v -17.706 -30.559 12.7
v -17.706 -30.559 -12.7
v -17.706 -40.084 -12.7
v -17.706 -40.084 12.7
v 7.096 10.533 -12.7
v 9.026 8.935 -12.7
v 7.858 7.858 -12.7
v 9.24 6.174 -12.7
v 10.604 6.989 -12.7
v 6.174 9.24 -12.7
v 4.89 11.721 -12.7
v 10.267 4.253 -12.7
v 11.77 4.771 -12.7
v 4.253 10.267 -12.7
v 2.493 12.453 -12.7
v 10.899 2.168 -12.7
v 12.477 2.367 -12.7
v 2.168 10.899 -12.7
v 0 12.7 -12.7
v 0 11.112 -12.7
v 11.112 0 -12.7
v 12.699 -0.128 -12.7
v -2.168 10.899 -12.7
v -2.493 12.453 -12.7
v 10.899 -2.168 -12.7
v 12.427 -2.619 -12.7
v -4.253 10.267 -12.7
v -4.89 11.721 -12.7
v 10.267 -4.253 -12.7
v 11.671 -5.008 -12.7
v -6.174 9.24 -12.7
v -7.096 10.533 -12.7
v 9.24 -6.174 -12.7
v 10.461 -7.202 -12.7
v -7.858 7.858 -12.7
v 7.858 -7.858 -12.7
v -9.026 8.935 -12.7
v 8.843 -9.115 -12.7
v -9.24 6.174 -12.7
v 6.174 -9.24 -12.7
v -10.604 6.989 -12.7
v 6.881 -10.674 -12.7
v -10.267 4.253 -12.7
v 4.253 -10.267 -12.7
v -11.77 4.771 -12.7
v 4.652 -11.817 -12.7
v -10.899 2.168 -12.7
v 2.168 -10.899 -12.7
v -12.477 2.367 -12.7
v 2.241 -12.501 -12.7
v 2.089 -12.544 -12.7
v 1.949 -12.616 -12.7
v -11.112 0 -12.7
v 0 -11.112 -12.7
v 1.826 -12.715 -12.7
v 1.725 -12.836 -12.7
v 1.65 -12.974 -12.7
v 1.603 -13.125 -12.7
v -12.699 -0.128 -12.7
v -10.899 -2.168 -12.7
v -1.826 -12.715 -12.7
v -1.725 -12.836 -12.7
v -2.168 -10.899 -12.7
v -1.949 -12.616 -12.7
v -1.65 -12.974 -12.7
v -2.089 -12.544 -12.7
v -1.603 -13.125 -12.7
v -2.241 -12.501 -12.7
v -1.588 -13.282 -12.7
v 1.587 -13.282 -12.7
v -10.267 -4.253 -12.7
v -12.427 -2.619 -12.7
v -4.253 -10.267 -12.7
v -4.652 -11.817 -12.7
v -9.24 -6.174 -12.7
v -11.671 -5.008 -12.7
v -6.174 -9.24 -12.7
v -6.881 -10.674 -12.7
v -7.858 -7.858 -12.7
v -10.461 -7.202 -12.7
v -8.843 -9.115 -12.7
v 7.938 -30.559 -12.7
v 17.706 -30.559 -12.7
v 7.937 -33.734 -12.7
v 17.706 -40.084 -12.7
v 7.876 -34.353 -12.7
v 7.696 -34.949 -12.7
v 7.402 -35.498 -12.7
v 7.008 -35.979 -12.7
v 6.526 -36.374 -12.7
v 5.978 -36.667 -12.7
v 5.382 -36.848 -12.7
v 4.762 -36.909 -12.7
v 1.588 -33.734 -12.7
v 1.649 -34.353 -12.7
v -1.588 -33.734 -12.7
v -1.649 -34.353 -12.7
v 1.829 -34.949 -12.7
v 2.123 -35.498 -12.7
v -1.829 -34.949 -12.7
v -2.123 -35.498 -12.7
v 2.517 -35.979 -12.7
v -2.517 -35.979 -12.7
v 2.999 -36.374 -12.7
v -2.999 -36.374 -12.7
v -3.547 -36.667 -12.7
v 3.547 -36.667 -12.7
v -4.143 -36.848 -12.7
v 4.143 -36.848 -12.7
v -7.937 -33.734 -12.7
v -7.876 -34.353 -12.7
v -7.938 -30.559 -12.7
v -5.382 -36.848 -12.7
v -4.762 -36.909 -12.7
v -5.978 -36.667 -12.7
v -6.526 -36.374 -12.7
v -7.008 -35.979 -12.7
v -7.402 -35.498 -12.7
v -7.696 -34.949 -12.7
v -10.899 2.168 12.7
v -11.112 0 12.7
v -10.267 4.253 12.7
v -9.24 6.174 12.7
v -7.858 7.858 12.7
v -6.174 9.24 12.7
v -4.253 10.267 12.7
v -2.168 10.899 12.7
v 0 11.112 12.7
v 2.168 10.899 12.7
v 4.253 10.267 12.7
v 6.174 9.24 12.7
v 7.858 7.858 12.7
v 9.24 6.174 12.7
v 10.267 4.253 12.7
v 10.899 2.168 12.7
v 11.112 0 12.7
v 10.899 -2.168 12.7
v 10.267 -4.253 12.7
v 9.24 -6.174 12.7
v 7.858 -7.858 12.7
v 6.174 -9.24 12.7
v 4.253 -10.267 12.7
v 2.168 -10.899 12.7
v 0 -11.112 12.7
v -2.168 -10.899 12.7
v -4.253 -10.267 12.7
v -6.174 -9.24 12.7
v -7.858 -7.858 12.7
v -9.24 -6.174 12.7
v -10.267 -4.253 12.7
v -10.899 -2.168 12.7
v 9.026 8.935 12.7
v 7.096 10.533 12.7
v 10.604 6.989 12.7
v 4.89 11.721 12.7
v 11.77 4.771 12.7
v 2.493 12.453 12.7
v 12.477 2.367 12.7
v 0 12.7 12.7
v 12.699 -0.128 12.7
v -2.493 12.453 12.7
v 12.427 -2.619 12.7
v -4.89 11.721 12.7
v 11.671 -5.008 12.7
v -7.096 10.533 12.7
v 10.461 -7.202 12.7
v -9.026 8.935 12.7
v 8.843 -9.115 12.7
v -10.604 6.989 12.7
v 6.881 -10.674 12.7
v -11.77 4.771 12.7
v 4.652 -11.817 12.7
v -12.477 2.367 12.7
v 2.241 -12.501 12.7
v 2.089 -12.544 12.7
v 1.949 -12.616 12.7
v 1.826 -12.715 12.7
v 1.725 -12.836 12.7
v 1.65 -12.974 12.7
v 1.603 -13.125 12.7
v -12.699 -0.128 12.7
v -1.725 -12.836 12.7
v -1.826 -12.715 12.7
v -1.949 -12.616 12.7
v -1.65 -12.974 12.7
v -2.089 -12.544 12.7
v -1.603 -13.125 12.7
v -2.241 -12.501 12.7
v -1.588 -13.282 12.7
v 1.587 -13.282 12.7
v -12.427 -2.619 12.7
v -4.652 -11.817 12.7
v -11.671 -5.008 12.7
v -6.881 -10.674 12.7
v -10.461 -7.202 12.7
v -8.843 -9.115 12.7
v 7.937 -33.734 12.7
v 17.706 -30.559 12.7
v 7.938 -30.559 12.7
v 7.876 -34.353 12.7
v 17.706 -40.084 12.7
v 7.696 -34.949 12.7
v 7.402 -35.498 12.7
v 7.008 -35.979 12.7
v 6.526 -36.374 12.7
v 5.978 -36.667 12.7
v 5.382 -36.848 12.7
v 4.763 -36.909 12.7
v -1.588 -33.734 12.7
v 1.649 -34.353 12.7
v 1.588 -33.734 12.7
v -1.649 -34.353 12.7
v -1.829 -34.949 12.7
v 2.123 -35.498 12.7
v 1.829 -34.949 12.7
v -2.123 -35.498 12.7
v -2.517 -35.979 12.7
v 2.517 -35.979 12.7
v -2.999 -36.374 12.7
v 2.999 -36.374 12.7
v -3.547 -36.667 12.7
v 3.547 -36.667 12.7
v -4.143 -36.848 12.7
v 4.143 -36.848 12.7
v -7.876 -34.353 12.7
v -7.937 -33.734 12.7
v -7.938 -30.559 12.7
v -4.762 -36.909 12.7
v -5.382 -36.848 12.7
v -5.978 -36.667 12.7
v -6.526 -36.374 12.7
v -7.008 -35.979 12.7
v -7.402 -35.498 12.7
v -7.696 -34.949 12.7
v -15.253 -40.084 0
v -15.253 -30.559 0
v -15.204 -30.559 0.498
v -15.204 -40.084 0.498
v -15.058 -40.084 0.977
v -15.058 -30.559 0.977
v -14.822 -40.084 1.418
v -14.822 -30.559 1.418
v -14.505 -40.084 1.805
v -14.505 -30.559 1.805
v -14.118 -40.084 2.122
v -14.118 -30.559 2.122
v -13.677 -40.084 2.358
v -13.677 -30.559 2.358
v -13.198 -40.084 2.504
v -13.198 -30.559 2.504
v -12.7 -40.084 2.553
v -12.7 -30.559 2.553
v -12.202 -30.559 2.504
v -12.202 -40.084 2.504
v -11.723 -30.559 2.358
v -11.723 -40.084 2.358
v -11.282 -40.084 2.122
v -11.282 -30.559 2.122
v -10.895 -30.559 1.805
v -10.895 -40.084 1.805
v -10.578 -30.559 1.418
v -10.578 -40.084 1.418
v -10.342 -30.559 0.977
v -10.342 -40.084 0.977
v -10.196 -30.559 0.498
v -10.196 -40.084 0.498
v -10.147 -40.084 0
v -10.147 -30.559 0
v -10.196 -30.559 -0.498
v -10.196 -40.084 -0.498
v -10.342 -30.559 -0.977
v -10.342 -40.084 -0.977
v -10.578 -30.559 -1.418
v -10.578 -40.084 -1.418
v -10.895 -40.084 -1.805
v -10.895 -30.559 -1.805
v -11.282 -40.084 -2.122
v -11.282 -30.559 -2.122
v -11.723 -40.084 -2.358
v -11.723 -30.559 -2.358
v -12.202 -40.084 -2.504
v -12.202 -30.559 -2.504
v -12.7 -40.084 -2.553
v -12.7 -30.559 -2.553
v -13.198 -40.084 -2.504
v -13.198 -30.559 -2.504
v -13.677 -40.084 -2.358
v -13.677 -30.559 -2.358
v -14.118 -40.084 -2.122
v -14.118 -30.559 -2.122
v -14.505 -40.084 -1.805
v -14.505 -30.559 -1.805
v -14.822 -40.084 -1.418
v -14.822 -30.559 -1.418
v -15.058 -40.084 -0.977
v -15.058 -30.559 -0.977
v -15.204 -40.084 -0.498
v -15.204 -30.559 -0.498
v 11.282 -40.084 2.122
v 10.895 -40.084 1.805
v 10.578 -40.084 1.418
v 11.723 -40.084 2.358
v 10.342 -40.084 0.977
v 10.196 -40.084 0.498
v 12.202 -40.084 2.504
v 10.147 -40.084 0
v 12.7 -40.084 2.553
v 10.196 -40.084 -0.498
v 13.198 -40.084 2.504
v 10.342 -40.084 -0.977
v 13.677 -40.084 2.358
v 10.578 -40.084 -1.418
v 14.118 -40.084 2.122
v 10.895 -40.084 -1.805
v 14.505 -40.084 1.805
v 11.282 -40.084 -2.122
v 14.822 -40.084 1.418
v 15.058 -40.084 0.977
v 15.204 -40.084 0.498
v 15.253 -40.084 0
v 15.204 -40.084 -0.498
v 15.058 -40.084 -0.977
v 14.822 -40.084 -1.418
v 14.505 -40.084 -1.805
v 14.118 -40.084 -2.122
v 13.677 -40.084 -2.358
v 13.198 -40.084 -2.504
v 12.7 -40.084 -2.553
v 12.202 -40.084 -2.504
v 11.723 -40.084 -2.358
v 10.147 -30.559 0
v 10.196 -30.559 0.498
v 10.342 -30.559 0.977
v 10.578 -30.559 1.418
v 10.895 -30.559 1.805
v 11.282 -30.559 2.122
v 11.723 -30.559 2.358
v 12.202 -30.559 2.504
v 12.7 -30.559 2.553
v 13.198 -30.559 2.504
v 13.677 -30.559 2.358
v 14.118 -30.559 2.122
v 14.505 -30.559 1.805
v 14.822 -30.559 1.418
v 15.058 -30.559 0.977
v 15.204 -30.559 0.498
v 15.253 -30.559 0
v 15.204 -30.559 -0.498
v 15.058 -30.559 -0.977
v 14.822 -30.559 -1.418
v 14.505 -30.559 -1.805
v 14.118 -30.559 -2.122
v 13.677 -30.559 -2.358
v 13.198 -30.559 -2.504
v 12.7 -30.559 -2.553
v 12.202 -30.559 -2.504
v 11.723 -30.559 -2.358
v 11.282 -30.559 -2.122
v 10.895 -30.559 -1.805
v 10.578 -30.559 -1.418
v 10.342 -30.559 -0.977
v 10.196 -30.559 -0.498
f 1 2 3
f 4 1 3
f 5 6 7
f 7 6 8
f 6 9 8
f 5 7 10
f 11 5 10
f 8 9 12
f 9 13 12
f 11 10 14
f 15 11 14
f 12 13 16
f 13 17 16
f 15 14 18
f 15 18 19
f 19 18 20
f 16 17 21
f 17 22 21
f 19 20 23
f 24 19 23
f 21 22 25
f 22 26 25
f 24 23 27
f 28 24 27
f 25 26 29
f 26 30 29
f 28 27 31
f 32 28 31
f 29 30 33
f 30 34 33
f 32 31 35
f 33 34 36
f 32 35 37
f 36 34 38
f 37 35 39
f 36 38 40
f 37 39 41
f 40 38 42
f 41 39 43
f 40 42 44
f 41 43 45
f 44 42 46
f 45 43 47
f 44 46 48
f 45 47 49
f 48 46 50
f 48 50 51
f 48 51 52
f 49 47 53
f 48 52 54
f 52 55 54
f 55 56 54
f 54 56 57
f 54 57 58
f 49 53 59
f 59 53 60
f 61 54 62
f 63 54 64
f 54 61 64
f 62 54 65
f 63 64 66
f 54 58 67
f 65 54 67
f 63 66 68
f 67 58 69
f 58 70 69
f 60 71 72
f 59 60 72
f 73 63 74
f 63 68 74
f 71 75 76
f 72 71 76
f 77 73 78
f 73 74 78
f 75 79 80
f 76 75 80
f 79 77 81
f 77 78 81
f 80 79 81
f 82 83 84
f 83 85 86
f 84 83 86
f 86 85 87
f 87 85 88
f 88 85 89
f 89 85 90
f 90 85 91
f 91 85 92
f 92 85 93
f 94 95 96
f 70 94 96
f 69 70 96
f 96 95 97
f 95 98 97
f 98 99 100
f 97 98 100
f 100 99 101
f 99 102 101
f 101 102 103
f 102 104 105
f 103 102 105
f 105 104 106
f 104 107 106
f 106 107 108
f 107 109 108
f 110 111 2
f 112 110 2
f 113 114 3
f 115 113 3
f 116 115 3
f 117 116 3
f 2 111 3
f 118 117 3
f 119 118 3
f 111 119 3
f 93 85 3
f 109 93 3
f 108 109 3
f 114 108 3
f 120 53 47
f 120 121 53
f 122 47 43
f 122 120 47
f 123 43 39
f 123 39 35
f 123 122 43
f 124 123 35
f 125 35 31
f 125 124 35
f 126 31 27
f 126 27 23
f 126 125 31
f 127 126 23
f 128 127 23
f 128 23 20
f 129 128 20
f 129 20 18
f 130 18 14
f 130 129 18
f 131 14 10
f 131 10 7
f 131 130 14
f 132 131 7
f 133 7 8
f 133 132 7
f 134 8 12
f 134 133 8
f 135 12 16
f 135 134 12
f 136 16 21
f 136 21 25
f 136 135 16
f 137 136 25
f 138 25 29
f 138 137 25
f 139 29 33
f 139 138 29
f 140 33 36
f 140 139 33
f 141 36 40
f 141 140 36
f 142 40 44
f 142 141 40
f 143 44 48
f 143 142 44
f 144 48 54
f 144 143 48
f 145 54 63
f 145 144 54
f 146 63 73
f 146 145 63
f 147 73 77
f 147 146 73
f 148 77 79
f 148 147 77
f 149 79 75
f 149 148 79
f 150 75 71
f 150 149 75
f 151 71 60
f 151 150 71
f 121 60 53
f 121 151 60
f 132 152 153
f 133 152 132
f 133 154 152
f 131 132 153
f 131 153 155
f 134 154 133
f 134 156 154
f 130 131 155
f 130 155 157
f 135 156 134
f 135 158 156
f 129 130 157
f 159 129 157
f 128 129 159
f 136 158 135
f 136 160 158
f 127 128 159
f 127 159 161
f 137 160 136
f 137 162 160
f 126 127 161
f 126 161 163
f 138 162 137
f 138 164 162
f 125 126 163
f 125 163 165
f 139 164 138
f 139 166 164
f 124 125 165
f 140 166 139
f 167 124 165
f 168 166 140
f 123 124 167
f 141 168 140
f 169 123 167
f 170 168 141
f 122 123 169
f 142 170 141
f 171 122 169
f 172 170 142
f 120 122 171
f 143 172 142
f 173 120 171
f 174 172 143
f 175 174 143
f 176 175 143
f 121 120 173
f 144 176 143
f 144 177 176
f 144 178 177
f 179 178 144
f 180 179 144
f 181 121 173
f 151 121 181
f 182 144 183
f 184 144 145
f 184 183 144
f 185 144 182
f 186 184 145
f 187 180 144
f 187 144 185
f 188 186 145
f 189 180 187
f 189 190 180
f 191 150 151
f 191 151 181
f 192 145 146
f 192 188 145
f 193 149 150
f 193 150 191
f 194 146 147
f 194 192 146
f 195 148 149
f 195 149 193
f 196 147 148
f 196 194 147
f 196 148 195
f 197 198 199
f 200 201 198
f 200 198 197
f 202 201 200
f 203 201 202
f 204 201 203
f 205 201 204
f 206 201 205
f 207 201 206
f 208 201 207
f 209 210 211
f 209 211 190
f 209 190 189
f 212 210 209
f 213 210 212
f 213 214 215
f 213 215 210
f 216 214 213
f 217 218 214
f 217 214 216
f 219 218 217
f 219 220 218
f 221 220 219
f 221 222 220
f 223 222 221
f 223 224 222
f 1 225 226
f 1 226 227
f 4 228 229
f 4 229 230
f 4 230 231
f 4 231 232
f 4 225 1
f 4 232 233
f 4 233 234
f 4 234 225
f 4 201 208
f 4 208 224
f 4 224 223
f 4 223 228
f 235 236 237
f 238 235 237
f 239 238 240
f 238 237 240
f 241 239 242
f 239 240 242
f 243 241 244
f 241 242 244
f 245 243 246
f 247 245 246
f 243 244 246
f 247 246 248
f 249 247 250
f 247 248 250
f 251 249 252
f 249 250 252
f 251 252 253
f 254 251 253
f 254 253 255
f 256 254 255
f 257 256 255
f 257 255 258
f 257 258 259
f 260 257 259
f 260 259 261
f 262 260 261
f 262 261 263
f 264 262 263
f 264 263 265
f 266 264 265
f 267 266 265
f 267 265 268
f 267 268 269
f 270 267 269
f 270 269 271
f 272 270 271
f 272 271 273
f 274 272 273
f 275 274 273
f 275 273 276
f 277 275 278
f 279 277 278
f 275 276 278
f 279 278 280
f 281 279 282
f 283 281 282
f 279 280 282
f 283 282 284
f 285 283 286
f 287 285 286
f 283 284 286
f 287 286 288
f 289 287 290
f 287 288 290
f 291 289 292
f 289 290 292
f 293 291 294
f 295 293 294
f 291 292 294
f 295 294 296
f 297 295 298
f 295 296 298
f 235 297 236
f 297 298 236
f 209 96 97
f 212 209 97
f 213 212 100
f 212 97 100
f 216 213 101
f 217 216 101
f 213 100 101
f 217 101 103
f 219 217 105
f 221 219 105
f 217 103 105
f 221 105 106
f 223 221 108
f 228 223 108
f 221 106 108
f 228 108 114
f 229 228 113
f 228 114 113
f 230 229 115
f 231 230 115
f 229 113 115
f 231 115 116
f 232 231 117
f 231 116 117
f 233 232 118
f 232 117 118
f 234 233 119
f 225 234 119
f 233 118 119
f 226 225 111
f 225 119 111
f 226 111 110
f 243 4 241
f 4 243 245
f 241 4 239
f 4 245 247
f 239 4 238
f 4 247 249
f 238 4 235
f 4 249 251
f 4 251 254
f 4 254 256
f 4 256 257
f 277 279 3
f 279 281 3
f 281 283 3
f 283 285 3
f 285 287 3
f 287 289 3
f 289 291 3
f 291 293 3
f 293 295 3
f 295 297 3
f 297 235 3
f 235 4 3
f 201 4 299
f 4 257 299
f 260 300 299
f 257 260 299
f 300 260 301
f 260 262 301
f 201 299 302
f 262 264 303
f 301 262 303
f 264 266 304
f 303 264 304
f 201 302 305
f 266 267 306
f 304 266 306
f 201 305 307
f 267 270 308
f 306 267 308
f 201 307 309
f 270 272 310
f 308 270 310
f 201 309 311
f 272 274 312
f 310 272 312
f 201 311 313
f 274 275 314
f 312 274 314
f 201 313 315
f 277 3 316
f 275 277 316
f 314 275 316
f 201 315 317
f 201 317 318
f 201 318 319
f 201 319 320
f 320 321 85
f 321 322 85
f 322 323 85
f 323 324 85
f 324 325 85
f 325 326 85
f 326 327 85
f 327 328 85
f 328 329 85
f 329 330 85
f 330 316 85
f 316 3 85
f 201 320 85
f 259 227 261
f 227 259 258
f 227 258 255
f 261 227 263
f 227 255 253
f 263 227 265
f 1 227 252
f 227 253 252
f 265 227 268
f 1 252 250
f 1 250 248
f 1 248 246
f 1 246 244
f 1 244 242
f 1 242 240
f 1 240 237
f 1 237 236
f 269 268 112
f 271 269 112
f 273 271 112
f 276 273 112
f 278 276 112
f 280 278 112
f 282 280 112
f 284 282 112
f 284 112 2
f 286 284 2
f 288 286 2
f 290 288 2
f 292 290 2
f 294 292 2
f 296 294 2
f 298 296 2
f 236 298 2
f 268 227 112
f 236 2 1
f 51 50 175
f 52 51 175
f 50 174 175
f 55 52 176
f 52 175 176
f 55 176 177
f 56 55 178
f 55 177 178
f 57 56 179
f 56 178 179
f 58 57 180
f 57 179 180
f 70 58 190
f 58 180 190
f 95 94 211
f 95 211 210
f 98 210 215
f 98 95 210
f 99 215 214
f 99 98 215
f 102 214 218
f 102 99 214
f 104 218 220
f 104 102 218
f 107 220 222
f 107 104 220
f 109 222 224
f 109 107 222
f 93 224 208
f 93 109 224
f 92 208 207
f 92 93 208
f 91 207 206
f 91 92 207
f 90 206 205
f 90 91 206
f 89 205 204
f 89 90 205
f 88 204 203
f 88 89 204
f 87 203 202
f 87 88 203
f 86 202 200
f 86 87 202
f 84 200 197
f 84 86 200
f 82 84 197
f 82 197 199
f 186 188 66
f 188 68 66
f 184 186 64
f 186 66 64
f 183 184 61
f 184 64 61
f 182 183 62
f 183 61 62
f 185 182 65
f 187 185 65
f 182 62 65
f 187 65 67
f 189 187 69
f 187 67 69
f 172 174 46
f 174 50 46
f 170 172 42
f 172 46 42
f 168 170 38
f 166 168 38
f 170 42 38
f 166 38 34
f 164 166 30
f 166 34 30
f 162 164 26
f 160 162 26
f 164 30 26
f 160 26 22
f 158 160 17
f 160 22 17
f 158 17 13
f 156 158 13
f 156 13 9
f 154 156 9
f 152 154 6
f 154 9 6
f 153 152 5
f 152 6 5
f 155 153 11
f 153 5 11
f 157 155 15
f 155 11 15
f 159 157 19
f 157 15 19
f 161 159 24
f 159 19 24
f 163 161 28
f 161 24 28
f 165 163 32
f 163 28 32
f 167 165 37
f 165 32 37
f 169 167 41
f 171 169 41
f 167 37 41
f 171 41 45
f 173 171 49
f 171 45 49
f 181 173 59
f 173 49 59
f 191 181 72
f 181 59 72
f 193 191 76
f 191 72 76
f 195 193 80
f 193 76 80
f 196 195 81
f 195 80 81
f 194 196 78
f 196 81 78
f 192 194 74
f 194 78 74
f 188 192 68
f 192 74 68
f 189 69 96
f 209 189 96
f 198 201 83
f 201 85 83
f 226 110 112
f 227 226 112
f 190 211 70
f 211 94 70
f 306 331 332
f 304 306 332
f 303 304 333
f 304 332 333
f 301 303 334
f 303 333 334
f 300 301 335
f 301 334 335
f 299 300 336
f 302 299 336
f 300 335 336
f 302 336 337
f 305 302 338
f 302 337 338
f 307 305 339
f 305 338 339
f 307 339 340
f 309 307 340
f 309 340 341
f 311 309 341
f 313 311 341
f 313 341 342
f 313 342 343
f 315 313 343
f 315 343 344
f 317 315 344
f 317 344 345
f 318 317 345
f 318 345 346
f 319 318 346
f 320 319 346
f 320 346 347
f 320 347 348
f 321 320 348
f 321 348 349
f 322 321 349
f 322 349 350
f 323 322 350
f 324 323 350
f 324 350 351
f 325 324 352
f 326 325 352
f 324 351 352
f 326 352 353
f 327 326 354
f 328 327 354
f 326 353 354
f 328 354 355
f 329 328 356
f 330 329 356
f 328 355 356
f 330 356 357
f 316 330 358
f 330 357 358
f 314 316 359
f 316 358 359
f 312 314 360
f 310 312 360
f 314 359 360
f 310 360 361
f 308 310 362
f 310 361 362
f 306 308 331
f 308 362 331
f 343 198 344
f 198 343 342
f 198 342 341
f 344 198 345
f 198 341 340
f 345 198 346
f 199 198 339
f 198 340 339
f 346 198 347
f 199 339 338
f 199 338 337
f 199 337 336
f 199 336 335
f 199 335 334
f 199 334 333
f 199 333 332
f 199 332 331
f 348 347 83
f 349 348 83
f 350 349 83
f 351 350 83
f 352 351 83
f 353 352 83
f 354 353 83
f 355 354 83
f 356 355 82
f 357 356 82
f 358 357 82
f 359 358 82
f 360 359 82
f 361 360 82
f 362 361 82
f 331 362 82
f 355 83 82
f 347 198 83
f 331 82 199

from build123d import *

# Parameters (mm, degrees)
SKETCH1_R                  = 11.1125
EXTRUDE1_DEPTH             = 12.7
BUSHING_SIDE_FILLETS_R     = 0.79375
MOUNT_SIDE_FILLETS_R       = 0.79375
F_1_4_MOUNTING_HOLES_D     = 5.1054
F_1_4_MOUNTING_HOLES_DEPTH = 19.05
F_1_4_MOUNTING_HOLES_TIP   = 1.533816902
EXTRUDE2_DEPTH             = 51.649420448


with BuildPart() as part:
    # Sketch1 → Extrude1 (new, symmetric)
    with BuildSketch(Plane(origin=(0, 0, 0), x_dir=(1, 0, 0), z_dir=(0, 0, -1))):
        with BuildLine():
            Line((-17.705953405, 40.0837), (17.705953405, 40.0837))
            Line((17.705953405, 40.0837), (17.705953405, 30.5587))
            Line((17.705953405, 30.5587), (1.5875, 30.5587))
            Line((1.5875, 30.5587), (1.5875, 12.600390619))
            ThreePointArc((1.5875, 12.600390619), (0, -12.7), (-1.5875, 12.600390619))
            Line((-1.5875, 12.600390619), (-1.5875, 30.5587))
            Line((-1.5875, 30.5587), (-17.705953405, 30.5587))
            Line((-17.705953405, 30.5587), (-17.705953405, 40.0837))
        make_face()
        with Locations(Location((0, 0, 0), (0, 0, 180))):
            Circle(SKETCH1_R, mode=Mode.SUBTRACT)
    extrude(amount=EXTRUDE1_DEPTH, both=True)

    # Bushing-side fillets
    bushing_side_fillets_edges = [part.edges().sort_by_distance(p)[0] for p in [
        (1.5875, -12.600390619, 0),
        (-1.5875, -12.600390619, 0),
    ]]
    fillet(bushing_side_fillets_edges, radius=BUSHING_SIDE_FILLETS_R)

    # Mount-side fillets
    mount_side_fillets_edges = [part.edges().sort_by_distance(p)[0] for p in [
        (1.5875, -30.5587, 0),
        (-1.5875, -30.5587, 0),
    ]]
    fillet(mount_side_fillets_edges, radius=MOUNT_SIDE_FILLETS_R)

    # 1/4 Mounting holes
    with Locations(Plane.XZ.offset(40.0837)):
        with Locations((-12.7, 0), (12.7, 0)):
            Hole(F_1_4_MOUNTING_HOLES_D / 2, depth=F_1_4_MOUNTING_HOLES_DEPTH)
            with Locations((0, 0, -(F_1_4_MOUNTING_HOLES_DEPTH + F_1_4_MOUNTING_HOLES_TIP / 2))):  # 118° drill point
                Cone(0, F_1_4_MOUNTING_HOLES_D / 2, F_1_4_MOUNTING_HOLES_TIP, mode=Mode.SUBTRACT)

    # Sketch4 → Extrude2 (cut, through all)
    with BuildSketch(Plane(origin=(0, 0, -12.7), x_dir=(-1, 0, 0), z_dir=(0, 0, -1))):
        with BuildLine():
            Line((1.5875, -29.76495), (1.5875, -33.7337))
            ThreePointArc((1.5875, -33.7337), (4.7625, -36.9087), (7.9375, -33.7337))
            Line((7.9375, -33.7337), (7.9375, -30.5587))
            Line((7.9375, -30.5587), (2.38125, -30.5587))
            ThreePointArc((2.38125, -30.5587), (1.819983992, -30.326216008), (1.5875, -29.76495))
        make_face()
        with BuildLine():
            Line((-7.9375, -30.5587), (-2.38125, -30.5587))
            ThreePointArc((-2.38125, -30.5587), (-1.819983992, -30.326216008), (-1.5875, -29.76495))
            Line((-1.5875, -29.76495), (-1.5875, -33.7337))
            ThreePointArc((-1.5875, -33.7337), (-4.7625, -36.9087), (-7.9375, -33.7337))
            Line((-7.9375, -33.7337), (-7.9375, -30.5587))
        make_face()
    extrude(amount=-EXTRUDE2_DEPTH, mode=Mode.SUBTRACT)


solid = part.part
